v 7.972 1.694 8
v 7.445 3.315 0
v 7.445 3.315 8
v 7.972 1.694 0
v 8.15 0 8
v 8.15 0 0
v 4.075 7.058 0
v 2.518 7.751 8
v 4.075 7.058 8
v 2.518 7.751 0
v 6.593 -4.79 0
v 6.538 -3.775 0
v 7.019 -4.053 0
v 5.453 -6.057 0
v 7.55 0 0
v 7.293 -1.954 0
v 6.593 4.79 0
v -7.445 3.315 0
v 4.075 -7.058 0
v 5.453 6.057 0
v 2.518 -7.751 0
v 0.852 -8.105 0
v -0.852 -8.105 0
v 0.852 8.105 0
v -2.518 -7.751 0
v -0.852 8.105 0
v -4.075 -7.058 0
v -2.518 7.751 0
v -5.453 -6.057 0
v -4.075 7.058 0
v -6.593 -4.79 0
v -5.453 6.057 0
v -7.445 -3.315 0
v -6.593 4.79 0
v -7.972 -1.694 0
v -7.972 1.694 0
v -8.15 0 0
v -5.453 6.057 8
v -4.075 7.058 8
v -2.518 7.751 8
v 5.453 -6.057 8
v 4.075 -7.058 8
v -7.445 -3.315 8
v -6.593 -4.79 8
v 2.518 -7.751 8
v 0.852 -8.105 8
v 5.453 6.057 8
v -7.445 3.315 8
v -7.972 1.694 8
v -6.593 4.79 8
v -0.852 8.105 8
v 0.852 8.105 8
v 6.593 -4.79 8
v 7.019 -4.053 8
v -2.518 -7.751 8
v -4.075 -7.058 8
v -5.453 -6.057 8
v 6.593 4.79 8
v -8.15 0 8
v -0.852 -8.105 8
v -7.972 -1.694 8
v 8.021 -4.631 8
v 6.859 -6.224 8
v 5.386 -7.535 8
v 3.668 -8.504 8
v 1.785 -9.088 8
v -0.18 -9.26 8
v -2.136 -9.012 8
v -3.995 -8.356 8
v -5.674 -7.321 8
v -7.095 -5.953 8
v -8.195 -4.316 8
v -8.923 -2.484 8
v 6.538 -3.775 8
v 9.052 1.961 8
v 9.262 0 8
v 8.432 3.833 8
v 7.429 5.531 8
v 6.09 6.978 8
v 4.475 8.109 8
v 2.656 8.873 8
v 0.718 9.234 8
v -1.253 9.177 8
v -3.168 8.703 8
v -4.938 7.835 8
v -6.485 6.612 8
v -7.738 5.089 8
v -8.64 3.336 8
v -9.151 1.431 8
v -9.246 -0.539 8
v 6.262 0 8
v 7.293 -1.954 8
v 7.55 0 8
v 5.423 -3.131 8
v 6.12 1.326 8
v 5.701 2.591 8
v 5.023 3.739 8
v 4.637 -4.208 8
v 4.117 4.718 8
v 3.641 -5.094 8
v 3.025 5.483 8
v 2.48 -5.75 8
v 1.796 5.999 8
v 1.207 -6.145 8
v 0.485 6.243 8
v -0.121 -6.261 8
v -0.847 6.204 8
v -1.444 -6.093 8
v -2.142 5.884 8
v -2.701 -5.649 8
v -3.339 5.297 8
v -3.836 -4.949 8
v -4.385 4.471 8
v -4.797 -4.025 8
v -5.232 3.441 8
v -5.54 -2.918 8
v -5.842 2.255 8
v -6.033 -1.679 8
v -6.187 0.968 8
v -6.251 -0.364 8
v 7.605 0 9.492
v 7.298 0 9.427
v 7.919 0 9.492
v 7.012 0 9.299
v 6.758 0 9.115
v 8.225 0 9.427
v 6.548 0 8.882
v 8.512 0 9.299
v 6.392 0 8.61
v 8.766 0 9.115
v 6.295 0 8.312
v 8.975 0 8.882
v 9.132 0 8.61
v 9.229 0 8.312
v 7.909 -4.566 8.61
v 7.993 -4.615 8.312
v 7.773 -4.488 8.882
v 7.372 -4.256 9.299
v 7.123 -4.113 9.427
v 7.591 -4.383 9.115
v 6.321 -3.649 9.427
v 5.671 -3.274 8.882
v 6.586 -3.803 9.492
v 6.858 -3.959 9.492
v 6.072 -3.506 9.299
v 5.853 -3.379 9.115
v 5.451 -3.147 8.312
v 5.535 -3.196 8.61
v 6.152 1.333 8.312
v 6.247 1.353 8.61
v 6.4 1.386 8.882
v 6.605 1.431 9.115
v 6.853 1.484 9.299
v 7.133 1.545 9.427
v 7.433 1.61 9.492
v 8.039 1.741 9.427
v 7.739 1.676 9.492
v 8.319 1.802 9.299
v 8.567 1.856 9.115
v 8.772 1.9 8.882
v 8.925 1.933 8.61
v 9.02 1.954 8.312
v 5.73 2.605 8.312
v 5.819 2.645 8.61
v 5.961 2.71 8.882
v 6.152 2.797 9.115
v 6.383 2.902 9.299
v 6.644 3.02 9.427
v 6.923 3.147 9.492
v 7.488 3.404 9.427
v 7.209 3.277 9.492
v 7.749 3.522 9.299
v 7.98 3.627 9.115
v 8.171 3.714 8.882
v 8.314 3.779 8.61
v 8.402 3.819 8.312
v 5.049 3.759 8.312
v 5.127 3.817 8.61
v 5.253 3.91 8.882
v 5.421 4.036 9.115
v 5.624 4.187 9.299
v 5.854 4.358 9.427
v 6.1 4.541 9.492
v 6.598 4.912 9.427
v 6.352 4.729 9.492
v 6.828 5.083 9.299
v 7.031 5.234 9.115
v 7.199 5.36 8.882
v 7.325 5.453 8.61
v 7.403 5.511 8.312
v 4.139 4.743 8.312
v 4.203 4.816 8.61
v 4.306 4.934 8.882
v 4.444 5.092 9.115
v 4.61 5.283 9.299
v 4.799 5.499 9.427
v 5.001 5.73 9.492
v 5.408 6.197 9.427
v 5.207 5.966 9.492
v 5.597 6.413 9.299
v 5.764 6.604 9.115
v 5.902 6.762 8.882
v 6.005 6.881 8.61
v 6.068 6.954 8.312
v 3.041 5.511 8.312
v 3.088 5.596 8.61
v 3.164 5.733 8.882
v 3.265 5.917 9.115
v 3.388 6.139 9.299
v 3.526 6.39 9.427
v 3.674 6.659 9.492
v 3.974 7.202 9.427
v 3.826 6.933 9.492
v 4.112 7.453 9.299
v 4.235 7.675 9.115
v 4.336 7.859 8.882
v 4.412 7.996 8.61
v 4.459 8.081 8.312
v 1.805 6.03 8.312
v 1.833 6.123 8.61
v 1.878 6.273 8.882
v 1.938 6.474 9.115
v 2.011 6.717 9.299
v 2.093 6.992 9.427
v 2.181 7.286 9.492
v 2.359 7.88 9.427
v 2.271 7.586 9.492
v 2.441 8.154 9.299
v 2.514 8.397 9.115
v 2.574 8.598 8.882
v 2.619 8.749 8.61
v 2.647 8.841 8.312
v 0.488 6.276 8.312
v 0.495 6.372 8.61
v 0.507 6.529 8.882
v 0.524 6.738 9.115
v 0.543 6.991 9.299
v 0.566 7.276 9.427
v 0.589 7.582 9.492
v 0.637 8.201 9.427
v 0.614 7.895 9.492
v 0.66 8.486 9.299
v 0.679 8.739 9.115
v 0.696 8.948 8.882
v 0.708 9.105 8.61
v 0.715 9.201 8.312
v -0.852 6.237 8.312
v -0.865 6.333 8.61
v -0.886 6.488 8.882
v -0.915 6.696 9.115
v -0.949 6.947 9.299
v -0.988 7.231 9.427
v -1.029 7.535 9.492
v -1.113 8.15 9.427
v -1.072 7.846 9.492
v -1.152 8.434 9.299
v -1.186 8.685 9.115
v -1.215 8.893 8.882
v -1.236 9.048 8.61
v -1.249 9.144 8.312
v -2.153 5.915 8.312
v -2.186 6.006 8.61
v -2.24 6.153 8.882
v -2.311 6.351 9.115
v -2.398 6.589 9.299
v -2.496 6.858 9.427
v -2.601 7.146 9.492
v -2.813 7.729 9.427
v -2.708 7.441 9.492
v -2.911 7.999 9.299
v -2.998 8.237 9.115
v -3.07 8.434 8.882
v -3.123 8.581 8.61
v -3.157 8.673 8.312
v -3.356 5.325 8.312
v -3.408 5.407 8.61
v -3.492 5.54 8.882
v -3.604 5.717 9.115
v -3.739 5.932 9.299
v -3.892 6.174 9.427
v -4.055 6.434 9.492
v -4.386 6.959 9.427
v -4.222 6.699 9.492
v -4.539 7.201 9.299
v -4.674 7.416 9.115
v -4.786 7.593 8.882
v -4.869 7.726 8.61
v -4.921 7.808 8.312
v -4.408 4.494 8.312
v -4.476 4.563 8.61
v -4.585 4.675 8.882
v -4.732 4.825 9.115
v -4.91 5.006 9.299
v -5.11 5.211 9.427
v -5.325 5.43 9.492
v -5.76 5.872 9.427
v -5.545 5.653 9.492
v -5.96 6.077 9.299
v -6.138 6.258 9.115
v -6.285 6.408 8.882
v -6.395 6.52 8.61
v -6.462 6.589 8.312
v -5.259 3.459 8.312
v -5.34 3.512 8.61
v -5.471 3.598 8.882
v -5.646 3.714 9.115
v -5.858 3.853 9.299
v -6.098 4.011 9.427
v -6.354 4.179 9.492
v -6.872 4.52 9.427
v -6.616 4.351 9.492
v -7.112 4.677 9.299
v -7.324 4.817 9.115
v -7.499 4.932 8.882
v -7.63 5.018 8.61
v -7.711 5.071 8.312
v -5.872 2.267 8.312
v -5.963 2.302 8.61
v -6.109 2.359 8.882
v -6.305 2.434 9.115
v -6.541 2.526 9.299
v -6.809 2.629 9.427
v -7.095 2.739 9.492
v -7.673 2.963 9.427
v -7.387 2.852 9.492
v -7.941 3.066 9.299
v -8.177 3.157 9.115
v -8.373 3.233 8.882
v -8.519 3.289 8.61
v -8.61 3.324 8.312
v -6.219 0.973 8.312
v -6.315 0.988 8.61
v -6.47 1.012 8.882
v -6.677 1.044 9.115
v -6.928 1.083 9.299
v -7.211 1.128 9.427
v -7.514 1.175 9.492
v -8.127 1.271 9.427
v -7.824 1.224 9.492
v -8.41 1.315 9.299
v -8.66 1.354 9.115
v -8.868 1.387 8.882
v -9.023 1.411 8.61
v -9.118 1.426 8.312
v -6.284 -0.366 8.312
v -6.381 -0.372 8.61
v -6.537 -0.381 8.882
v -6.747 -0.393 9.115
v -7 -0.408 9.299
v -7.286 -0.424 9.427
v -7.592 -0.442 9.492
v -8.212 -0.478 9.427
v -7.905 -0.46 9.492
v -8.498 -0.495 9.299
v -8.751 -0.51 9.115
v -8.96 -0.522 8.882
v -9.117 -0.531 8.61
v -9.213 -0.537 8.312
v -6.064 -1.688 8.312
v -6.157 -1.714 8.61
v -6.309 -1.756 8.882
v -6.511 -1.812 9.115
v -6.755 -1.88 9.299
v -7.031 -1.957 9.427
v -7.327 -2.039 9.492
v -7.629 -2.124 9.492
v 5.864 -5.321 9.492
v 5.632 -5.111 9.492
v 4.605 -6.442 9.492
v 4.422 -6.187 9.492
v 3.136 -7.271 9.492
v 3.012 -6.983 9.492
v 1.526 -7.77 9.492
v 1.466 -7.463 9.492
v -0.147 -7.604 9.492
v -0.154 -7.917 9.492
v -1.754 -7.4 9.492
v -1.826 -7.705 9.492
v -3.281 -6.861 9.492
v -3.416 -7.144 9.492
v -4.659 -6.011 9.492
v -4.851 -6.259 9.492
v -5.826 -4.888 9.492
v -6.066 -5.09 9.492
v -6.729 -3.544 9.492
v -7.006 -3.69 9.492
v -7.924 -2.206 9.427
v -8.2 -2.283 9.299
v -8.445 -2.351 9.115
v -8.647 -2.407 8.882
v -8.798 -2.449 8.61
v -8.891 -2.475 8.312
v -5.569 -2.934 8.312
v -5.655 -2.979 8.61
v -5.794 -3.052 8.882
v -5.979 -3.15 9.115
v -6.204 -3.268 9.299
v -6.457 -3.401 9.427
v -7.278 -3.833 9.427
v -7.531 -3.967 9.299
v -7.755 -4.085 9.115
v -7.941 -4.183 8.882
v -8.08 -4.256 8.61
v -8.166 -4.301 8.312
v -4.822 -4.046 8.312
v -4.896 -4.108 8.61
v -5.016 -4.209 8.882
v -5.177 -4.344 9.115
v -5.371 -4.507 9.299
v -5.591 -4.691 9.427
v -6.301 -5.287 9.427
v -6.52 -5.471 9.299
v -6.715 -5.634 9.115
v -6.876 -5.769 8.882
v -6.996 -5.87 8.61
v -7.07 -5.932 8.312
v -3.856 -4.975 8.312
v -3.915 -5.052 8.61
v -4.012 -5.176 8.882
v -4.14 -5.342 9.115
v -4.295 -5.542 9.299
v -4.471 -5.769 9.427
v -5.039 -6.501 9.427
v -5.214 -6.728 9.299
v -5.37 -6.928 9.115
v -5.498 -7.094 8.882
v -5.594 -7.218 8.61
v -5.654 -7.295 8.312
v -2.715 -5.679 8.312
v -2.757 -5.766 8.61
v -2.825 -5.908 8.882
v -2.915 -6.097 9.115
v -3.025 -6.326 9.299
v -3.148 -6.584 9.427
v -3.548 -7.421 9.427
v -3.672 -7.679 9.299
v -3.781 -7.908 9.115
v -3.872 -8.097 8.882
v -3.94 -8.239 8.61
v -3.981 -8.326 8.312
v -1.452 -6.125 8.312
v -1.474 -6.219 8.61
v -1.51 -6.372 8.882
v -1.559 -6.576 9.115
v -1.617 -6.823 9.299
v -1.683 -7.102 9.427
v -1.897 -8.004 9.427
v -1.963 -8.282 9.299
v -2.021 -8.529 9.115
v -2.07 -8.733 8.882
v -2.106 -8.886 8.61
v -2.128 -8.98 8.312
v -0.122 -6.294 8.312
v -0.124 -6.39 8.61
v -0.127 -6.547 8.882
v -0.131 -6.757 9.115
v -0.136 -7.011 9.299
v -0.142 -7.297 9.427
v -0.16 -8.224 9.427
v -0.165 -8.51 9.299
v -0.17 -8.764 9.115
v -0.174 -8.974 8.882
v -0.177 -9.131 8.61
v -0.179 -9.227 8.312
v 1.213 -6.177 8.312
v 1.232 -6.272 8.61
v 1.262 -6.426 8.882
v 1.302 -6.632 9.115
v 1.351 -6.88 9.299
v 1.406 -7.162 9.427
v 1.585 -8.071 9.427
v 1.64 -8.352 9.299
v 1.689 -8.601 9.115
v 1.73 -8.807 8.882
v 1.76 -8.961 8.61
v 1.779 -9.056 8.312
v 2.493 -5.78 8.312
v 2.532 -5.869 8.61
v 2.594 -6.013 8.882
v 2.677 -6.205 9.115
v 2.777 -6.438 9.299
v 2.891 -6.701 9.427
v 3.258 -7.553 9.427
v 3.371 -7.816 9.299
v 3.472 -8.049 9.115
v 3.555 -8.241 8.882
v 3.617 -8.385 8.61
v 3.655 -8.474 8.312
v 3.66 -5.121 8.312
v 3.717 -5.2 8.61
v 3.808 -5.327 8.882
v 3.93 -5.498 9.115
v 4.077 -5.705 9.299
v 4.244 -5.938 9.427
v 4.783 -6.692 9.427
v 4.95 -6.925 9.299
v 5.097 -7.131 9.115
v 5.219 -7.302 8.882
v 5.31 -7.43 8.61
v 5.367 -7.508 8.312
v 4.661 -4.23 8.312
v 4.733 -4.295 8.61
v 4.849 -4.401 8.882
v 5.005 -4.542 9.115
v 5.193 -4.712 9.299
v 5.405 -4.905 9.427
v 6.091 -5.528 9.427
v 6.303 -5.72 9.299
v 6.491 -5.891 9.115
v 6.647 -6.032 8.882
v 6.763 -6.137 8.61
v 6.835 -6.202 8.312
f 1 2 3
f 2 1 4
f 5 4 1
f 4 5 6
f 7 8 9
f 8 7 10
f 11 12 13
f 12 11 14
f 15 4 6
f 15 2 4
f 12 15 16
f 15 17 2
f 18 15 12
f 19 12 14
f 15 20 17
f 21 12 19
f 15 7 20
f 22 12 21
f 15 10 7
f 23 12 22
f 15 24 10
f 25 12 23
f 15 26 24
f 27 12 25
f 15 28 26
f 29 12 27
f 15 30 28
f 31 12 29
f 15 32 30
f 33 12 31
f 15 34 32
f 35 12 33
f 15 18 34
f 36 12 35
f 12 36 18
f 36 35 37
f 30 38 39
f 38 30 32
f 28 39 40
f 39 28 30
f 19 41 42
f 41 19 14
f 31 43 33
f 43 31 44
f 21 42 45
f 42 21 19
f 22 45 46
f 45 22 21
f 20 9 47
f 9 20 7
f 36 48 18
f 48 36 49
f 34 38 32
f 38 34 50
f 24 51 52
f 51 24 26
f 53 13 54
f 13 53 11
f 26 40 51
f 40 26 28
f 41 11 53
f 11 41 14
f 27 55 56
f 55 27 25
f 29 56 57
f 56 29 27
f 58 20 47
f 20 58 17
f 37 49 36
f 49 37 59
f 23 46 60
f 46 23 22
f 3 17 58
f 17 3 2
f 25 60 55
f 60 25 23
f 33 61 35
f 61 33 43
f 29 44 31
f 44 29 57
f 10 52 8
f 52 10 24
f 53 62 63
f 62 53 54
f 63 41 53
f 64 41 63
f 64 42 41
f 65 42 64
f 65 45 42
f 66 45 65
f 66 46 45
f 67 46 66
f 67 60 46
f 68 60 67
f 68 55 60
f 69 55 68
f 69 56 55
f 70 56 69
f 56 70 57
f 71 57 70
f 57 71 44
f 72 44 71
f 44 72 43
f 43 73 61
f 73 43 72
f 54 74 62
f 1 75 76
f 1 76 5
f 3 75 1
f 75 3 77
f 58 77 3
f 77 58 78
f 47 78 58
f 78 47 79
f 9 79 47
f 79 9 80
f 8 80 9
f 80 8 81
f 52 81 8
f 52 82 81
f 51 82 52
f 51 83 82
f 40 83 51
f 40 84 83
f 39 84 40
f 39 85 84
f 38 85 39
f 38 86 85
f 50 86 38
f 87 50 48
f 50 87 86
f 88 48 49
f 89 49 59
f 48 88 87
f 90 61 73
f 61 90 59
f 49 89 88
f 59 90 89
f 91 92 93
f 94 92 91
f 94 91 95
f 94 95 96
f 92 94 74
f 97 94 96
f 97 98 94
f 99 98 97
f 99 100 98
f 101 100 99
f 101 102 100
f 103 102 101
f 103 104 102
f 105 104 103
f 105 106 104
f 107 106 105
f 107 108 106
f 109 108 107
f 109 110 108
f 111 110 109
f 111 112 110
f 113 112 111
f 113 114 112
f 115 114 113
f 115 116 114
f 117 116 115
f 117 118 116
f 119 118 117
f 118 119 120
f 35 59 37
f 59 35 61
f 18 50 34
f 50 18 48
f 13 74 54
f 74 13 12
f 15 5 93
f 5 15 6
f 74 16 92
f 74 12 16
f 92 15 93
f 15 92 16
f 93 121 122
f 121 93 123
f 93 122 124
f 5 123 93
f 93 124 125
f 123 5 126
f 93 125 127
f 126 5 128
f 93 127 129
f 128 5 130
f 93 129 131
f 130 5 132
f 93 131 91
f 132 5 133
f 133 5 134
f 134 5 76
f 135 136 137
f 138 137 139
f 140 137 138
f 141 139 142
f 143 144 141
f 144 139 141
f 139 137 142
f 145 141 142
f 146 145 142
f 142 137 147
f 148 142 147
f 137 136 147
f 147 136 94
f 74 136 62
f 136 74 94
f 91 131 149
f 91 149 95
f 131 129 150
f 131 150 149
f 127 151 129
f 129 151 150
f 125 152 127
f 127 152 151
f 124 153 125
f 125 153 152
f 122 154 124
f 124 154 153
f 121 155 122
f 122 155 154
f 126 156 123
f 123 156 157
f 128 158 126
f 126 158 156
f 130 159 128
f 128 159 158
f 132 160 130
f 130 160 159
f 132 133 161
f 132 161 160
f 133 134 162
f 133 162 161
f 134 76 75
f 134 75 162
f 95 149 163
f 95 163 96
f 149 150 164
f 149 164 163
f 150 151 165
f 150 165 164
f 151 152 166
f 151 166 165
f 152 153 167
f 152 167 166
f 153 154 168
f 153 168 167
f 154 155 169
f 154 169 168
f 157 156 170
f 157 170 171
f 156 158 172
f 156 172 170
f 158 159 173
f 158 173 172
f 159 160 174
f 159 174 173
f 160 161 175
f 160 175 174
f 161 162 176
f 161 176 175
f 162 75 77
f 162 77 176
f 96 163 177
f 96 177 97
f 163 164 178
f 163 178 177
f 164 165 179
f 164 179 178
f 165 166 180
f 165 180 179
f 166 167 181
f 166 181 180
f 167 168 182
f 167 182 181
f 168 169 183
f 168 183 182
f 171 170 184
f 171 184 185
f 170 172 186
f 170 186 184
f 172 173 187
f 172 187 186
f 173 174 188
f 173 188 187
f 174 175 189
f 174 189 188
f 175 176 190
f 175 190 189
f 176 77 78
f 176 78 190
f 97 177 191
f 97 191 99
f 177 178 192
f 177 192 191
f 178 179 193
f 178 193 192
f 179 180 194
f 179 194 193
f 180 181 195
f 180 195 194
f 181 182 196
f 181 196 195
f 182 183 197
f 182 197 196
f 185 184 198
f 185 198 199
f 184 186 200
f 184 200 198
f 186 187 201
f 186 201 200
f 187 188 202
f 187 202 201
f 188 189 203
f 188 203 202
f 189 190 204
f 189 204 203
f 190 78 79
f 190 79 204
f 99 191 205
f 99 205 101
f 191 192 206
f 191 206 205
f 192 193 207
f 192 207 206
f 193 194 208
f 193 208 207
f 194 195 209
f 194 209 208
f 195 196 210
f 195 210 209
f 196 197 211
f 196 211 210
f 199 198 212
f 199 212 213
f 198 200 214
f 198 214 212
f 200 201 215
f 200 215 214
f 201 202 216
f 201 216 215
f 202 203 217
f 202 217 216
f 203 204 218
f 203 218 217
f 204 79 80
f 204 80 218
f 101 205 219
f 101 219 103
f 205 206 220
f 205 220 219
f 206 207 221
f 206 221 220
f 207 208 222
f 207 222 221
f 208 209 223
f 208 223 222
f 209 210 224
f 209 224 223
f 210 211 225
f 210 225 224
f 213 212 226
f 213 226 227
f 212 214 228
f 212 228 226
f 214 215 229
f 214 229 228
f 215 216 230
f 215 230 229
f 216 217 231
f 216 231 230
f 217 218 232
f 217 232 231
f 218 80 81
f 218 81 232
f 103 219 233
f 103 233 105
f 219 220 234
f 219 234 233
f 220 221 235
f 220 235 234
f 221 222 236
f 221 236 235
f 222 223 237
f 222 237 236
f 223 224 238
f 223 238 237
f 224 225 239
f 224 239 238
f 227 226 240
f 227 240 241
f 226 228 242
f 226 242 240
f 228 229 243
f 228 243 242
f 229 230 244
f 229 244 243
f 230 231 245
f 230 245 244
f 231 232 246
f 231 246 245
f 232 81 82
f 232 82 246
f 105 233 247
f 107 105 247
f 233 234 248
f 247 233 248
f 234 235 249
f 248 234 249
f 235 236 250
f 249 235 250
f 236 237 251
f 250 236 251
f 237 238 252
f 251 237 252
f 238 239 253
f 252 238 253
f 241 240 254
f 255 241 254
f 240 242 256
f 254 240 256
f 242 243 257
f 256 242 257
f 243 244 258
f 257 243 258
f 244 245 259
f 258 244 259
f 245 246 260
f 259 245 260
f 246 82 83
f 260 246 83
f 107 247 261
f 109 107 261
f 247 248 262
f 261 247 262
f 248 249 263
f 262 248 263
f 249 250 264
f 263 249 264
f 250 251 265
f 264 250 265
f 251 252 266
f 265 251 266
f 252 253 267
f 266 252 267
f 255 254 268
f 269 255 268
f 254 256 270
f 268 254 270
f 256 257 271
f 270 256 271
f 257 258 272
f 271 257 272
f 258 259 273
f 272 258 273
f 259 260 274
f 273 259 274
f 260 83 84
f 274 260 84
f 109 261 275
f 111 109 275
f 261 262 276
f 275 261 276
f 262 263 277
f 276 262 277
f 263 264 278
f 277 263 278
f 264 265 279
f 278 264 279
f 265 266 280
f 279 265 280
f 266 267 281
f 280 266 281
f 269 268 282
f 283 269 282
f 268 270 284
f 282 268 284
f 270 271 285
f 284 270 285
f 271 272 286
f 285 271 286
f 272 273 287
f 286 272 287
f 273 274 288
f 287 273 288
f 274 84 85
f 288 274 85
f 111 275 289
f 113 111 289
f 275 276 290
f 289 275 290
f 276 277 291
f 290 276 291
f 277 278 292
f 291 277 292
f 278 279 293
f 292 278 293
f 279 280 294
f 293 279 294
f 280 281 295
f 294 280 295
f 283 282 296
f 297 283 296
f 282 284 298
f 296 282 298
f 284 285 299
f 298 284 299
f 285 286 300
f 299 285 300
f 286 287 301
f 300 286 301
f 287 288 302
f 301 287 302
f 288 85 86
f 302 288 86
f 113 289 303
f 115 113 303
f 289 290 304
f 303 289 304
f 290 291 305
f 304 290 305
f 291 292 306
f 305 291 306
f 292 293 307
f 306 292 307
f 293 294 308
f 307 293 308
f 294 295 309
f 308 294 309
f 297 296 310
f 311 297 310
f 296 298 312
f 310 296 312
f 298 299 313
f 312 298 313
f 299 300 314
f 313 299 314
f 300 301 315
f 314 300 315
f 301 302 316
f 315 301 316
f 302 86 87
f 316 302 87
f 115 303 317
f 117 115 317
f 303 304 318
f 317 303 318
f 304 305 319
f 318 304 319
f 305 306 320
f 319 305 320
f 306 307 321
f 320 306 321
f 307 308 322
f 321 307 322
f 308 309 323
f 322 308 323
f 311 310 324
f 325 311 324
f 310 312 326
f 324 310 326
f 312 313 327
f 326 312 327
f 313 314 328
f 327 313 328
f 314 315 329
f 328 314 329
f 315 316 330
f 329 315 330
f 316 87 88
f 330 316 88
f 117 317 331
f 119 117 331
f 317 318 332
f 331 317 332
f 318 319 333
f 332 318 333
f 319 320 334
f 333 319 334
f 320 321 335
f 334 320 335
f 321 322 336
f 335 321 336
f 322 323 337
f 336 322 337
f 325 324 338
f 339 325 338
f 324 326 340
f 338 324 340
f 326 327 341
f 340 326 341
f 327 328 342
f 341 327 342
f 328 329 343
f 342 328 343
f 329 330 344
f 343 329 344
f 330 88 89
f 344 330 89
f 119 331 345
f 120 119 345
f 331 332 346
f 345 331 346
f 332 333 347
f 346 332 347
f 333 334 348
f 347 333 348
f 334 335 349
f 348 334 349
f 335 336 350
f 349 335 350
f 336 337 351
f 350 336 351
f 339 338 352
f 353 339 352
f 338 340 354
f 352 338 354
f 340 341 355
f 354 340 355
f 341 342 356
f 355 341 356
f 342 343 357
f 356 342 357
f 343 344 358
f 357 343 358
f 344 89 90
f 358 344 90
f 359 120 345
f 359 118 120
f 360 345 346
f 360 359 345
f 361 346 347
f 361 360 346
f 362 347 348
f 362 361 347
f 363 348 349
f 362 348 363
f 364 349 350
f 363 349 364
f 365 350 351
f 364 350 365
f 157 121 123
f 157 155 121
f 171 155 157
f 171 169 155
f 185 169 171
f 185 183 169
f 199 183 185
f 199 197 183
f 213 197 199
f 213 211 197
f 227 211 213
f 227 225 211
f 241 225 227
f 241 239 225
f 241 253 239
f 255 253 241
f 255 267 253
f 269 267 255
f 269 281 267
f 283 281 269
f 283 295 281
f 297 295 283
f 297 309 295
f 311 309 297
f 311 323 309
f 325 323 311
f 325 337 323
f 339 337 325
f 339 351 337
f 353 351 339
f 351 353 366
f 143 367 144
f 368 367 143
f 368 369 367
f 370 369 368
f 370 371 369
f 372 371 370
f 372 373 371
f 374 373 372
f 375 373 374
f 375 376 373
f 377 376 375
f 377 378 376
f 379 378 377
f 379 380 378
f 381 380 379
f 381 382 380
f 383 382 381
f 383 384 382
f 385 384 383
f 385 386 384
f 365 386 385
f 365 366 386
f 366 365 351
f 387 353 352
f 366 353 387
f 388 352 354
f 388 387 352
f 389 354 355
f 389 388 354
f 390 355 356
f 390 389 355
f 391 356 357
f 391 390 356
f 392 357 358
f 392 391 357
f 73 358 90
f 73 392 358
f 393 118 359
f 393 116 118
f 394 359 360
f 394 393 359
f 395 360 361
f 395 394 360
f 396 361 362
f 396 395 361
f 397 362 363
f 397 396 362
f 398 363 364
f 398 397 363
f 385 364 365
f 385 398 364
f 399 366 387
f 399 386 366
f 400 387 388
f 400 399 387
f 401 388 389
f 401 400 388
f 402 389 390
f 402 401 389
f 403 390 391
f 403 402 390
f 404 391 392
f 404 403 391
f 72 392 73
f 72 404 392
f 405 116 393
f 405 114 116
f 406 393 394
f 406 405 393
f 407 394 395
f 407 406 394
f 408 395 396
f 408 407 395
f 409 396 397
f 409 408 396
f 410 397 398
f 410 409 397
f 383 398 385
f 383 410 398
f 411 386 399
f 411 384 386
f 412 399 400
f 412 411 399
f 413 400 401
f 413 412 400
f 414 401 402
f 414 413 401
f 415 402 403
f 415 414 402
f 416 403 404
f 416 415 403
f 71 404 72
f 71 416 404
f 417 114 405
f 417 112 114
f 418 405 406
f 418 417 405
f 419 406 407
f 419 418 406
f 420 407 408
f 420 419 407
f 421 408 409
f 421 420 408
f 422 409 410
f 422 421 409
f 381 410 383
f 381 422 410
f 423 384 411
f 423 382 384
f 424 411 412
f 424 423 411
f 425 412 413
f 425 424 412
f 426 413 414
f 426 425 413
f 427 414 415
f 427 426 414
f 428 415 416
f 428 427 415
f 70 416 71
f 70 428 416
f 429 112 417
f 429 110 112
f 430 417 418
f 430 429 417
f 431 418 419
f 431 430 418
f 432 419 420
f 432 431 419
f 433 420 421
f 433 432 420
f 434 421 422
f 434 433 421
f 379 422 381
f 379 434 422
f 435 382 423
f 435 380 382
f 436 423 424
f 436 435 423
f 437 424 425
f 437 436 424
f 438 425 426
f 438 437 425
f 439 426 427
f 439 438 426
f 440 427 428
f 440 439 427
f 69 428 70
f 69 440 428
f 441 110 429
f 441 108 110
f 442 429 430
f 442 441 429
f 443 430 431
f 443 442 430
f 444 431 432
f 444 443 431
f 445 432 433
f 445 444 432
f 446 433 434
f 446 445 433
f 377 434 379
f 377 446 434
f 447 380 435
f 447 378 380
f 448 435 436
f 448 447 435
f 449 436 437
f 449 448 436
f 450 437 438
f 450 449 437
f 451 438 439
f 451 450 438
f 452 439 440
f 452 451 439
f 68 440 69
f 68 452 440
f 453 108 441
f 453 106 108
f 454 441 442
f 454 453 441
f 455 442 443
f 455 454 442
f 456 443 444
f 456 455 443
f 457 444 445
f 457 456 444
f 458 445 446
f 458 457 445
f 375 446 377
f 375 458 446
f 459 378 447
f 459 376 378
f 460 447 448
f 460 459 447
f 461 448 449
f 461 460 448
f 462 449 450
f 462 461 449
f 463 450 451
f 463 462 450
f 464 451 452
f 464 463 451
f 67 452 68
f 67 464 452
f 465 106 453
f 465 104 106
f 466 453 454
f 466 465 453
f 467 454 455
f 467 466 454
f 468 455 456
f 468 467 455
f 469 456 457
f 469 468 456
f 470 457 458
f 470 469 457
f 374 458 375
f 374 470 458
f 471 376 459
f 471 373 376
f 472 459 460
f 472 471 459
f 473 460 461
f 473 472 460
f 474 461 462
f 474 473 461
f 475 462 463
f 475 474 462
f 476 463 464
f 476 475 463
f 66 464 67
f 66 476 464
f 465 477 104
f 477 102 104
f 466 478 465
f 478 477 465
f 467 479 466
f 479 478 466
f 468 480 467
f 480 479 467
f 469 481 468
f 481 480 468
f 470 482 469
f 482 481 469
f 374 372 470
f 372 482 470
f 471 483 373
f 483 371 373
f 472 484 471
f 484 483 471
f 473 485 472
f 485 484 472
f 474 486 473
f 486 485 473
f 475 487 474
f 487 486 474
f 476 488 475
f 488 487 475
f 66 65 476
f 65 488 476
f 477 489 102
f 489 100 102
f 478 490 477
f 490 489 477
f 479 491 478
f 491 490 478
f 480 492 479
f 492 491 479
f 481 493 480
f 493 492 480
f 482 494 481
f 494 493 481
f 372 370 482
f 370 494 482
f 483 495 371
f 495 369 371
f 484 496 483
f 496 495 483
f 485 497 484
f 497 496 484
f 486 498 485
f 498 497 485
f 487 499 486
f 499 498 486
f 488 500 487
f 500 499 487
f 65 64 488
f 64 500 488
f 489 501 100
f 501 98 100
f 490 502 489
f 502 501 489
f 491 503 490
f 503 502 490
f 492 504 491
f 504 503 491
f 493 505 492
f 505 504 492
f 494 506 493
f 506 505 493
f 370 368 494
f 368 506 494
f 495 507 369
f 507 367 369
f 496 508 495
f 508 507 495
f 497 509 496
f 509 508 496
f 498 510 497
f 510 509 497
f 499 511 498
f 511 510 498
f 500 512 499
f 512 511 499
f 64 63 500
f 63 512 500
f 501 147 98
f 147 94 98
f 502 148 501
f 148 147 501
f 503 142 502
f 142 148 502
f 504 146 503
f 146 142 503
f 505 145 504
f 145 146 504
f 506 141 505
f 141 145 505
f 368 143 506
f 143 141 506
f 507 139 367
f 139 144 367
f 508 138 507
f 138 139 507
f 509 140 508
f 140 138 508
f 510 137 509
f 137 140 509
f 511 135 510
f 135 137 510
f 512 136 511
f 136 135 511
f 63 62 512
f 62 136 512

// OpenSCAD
/*
Anemometer Pipe Cap for Hall Sensor

Created November 28, 2023
Modified January 11, 2024

1/11/24: Increased OD of lip rim for easier removal
*/

pipe_od = 20; // stay inside pipe od
cap_od = 16.3; // ID of amazon pipe

cap_bott_h = 8;
cap_top_d = 3; // diameter of half circle to rotate_extrude on top lip
theta = 330;

// slot for hall sensor
slot_w = 1.2;  // notch is half this distance from ID of pipe
slot_h = cap_bott_h;

$fs = 0.1;

/*
rotate half circle around top lip, 330 degrees
cut small slot for hall sensor
*/

module half_circle() {
    difference() {
        circle(d=cap_top_d);
        translate([0, -cap_top_d/2])
            square(size=[cap_top_d, cap_top_d], center=true);
    }
}

module plug() {
    difference() {
        cylinder(d=cap_od, h=cap_bott_h);

        color("red")
        rotate(theta)
        translate([0, 0, cap_bott_h/2])
        rotate_extrude(angle=360 - theta)
        translate([cap_od/2, 0])
        square(size=[slot_w, slot_h], center=true);
    }
}

module plug_top() {
    rotate_extrude(angle=theta)
    translate([cap_od/2.1, 0, 0])
    half_circle();
}


module draw_plug() {
    plug();
    translate([0, 0, cap_bott_h])
        plug_top();
}

draw_plug();
